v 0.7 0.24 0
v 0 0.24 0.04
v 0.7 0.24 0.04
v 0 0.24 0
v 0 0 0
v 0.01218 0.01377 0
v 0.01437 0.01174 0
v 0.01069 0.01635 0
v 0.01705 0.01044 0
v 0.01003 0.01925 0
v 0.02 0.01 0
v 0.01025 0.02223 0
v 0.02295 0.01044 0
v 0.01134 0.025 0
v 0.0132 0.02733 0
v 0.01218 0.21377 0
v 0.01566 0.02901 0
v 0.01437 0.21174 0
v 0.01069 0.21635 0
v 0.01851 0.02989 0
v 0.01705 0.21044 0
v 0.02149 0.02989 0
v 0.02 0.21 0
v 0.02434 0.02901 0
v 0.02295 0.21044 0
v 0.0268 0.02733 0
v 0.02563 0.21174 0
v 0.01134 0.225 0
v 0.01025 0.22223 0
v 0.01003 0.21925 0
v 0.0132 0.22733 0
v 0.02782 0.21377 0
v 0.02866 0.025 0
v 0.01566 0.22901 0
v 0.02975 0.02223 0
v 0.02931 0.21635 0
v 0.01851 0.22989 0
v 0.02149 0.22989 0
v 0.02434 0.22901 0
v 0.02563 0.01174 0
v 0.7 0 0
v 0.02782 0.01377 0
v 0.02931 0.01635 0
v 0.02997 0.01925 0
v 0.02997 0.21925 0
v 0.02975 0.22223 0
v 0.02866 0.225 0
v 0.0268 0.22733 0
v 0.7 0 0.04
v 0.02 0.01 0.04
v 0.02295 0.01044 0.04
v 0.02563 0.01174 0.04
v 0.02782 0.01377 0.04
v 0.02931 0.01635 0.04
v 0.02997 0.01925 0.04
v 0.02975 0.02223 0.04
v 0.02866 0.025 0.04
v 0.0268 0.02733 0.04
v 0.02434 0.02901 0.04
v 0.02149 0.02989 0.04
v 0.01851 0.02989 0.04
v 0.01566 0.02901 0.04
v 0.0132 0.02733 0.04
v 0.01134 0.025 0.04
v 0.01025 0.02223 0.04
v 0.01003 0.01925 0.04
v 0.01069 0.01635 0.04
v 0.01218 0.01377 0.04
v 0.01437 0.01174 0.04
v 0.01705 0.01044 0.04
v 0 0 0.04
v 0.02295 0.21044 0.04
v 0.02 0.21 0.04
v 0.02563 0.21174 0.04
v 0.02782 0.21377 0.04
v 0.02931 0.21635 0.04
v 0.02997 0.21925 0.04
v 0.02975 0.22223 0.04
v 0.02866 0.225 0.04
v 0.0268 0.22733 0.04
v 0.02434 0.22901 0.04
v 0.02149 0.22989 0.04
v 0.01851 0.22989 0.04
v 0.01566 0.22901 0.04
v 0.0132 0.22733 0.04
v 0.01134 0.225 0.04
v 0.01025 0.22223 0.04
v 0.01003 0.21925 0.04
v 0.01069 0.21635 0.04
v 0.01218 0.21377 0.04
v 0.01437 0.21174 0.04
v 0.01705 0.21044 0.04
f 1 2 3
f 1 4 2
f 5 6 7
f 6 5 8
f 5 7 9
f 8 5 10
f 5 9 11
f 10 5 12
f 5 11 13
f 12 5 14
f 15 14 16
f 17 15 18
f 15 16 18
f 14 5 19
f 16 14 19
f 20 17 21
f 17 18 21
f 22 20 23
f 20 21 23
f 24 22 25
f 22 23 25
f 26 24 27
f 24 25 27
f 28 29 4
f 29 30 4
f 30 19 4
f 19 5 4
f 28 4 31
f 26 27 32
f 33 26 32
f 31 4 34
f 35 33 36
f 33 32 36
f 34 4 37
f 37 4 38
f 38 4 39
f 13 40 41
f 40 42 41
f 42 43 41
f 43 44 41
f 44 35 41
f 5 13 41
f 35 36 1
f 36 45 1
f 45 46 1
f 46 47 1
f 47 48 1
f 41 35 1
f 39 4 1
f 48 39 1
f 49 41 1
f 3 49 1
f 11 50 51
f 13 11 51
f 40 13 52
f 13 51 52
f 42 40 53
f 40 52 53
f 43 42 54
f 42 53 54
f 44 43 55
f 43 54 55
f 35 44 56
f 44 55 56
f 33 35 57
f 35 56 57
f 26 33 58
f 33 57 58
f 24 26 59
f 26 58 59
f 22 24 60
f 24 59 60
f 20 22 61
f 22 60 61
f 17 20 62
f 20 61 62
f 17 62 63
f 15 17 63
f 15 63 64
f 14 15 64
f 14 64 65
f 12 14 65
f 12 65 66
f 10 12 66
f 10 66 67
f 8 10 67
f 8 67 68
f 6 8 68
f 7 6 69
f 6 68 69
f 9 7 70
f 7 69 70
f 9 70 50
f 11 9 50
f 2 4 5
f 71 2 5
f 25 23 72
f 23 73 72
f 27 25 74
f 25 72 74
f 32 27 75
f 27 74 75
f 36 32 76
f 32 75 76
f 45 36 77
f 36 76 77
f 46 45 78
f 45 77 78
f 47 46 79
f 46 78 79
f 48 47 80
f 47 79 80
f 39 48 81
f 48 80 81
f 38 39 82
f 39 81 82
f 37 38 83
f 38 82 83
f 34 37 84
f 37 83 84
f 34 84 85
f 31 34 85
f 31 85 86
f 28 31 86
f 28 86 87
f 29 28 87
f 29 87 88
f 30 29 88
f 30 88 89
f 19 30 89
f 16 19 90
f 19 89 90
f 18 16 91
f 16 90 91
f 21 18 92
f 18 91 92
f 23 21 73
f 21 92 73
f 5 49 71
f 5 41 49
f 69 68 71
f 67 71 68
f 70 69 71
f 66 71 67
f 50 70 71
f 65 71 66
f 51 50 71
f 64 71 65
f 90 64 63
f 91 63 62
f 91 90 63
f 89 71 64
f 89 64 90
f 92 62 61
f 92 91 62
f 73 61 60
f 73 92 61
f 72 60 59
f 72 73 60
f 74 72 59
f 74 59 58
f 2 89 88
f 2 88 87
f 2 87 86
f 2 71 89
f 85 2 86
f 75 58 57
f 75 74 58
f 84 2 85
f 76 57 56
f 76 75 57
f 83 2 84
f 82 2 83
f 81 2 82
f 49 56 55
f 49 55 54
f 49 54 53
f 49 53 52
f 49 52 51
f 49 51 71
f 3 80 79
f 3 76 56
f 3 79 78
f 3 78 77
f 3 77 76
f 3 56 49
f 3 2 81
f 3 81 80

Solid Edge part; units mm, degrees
sketch "Sketch1" plane through (0, 0, 0) normal (0, 0, 1) x (1, 0, 0)
  line L0 (0.7, 0) -> (0.7, 0.24)
  line L1 (0, 0.24) -> (0.7, 0.24)
  line L2 (0, 0.24) -> (0, 0)
  line L3 (0.7, 0) -> (0, 0)
  dimension "D1" = 0.04
extrude "Protrusion1" add sketch "Sketch1" along normal blind 0.04
hole "Bohrung_1" at (0.02, 0.02, 0.04) direction (0, 0, -1) diameter 0.02 end through all
hole "Hole1" at (0.02, 0.22, 0.04) direction (0, 0, -1) diameter 0.02 end through all
